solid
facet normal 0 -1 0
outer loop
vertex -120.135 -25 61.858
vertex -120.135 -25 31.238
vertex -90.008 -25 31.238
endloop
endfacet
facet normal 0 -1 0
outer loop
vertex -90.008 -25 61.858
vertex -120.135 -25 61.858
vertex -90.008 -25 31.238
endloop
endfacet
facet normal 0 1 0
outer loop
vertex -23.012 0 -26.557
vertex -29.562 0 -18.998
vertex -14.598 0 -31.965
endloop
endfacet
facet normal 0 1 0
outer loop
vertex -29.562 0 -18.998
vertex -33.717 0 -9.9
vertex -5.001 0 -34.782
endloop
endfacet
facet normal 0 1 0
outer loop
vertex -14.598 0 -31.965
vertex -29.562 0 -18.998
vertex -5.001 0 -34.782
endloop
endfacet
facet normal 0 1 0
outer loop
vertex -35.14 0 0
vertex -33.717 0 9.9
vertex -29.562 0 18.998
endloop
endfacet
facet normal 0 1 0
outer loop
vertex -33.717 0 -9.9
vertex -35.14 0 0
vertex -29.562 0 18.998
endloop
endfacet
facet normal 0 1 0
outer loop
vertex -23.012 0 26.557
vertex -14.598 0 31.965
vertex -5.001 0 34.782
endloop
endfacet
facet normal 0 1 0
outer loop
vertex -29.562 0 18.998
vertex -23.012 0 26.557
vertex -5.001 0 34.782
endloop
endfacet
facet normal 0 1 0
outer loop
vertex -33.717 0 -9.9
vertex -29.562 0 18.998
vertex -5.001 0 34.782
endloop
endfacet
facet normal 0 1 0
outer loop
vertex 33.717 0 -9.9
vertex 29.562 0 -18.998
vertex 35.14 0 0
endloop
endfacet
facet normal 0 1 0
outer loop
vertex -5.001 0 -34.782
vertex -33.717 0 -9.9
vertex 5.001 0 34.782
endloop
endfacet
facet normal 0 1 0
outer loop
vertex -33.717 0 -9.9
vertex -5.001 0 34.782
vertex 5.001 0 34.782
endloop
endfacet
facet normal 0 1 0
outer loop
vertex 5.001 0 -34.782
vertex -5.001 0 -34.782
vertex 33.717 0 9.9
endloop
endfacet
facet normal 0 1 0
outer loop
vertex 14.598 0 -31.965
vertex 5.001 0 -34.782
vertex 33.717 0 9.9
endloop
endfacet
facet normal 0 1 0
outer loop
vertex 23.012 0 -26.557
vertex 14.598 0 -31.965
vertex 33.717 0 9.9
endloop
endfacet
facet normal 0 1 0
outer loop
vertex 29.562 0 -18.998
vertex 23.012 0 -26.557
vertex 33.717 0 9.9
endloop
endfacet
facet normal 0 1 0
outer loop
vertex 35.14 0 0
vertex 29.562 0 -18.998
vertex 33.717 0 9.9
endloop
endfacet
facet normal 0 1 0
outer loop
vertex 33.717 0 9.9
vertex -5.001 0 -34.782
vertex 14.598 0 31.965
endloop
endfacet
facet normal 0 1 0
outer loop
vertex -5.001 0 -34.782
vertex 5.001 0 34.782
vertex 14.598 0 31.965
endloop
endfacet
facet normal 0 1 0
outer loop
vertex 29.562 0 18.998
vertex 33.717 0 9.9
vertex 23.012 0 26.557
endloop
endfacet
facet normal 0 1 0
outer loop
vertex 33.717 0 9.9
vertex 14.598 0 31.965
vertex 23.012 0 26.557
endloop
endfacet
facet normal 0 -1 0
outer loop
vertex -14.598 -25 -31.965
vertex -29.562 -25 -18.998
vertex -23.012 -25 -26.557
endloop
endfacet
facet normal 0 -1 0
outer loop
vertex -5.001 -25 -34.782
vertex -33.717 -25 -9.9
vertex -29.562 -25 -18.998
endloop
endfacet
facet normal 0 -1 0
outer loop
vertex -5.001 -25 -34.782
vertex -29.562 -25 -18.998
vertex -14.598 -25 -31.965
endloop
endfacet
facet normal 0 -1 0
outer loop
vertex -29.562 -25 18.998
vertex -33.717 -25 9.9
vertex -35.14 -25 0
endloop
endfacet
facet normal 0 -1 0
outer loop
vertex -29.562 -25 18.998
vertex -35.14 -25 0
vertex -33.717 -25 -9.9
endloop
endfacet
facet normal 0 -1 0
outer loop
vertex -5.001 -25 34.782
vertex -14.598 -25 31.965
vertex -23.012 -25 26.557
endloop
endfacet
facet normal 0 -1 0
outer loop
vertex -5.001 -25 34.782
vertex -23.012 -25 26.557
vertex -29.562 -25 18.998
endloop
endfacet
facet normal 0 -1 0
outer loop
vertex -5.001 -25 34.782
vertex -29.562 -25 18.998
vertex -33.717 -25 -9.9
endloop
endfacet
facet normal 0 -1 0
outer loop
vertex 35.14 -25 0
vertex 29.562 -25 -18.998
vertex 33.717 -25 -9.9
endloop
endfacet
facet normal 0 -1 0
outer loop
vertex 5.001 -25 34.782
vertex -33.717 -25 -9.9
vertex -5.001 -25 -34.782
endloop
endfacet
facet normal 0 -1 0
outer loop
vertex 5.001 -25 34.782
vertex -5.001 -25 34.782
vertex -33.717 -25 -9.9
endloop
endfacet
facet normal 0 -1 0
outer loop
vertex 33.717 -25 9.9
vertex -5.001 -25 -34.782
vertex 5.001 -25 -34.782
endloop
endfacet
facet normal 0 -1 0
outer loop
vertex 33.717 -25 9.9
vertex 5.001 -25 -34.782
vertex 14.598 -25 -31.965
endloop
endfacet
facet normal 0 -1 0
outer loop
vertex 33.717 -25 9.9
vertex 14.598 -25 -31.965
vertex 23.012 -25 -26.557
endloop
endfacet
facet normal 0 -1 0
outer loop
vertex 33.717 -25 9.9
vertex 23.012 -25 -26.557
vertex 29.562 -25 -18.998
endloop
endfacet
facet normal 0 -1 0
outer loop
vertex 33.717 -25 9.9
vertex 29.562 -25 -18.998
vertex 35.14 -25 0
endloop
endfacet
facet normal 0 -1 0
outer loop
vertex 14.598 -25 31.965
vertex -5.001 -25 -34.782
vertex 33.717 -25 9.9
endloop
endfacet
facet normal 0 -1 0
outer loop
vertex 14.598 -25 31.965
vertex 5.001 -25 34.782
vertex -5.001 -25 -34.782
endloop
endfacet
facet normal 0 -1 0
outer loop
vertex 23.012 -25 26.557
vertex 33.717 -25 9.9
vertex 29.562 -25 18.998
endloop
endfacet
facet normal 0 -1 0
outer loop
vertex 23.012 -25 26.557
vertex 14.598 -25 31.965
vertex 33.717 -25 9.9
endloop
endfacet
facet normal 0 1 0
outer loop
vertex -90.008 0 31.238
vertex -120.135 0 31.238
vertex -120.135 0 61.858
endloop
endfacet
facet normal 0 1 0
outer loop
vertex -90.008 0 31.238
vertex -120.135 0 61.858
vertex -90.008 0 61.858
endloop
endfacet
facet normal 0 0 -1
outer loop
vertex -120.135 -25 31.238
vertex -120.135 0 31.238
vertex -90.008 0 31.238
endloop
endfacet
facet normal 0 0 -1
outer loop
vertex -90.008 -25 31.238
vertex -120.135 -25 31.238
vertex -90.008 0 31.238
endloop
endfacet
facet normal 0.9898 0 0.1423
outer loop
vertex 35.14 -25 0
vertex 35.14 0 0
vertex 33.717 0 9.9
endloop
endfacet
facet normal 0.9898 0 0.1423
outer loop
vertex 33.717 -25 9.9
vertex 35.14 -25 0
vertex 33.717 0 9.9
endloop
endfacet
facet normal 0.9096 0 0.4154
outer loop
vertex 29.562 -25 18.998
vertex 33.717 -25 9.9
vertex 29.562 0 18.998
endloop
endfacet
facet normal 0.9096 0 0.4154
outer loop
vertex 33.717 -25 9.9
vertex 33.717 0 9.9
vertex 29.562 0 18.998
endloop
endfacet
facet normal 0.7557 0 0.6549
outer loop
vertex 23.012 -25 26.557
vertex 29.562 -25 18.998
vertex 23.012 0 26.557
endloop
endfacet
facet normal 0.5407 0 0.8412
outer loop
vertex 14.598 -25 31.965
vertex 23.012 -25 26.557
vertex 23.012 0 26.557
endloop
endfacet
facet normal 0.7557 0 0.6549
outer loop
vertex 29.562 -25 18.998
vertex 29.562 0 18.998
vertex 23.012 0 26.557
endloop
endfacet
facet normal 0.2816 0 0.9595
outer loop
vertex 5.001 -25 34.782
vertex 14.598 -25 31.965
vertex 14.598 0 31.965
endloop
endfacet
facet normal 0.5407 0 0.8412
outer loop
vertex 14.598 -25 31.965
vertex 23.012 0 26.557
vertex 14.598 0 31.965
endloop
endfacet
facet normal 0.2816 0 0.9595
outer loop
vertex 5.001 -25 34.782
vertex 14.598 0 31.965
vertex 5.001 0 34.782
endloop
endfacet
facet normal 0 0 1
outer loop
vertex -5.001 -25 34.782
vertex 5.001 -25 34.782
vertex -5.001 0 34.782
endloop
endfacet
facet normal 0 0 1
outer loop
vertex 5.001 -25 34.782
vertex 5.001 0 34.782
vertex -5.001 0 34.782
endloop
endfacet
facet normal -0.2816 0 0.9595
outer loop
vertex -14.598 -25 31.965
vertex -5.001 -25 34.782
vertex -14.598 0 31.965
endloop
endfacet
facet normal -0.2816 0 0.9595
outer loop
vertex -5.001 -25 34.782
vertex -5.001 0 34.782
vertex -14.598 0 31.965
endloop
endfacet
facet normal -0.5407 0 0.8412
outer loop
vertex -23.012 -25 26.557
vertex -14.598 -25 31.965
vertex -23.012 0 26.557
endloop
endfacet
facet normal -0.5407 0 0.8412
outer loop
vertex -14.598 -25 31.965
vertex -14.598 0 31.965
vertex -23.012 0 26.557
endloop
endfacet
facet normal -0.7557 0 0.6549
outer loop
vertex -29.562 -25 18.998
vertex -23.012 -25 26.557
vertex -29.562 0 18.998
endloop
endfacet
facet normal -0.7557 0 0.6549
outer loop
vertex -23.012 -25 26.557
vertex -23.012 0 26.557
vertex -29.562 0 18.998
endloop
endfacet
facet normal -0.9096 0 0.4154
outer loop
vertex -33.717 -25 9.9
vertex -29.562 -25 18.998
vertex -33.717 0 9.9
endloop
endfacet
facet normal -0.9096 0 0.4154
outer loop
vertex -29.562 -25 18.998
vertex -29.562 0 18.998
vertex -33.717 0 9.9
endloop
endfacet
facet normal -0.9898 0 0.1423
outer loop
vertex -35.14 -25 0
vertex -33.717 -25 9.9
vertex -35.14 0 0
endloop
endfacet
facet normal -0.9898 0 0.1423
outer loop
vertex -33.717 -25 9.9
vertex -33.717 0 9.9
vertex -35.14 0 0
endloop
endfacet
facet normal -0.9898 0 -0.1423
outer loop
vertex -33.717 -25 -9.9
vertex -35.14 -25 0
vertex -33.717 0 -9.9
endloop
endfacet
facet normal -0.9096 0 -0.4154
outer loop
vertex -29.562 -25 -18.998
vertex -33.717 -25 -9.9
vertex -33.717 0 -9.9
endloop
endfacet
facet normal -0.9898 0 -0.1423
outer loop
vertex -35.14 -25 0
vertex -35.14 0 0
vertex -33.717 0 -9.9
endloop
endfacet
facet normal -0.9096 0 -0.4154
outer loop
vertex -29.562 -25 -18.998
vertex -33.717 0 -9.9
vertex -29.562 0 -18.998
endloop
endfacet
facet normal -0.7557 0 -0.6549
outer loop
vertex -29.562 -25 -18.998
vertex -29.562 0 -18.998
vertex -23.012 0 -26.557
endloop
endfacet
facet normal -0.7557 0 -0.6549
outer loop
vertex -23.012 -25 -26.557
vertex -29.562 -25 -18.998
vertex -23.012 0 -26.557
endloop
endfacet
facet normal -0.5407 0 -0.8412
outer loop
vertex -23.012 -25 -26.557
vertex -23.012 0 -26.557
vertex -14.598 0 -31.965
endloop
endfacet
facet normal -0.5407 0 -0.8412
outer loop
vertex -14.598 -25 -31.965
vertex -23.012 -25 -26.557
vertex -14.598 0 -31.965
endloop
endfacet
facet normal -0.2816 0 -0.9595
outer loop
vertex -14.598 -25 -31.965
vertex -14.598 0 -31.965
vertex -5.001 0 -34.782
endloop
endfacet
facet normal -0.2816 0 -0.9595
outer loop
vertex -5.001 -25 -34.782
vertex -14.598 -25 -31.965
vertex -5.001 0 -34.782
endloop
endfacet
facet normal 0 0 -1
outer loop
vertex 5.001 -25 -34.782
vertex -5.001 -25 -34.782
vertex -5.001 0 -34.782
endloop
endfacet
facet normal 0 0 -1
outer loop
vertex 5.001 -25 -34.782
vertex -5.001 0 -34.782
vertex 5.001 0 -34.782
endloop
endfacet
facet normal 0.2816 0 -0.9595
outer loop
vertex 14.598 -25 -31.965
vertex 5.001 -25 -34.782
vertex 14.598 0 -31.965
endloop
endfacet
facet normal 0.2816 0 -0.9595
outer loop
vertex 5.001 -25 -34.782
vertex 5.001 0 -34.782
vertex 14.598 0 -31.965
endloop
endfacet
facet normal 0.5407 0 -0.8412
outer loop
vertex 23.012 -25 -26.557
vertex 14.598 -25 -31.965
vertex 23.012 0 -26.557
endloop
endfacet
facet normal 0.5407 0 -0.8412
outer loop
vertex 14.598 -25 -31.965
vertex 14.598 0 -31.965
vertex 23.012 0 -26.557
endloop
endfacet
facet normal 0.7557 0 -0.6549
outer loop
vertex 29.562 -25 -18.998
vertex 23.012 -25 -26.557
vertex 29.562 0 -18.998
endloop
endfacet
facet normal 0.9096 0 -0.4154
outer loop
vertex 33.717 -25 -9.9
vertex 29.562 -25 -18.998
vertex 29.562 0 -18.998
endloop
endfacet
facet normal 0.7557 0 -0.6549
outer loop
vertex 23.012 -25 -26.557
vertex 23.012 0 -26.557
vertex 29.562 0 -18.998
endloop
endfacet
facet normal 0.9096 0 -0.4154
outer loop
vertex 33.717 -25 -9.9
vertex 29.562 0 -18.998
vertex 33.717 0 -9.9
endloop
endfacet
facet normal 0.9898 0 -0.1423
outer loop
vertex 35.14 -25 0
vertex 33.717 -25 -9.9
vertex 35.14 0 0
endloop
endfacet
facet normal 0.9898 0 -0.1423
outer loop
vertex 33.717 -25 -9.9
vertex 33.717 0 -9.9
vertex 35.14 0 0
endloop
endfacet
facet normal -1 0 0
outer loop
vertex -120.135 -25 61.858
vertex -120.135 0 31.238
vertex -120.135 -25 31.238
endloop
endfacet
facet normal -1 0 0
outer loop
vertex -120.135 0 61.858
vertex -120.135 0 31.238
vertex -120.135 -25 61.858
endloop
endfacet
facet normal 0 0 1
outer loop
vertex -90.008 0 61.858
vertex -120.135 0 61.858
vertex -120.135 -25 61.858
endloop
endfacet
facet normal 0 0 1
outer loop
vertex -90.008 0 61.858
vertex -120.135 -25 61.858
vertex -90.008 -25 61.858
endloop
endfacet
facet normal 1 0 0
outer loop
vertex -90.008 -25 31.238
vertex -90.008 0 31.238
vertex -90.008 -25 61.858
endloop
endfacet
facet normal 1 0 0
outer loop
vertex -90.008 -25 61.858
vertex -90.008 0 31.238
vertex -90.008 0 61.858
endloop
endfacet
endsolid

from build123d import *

# Parameters (mm, degrees)
F0_R     = 35.140148
F1_DEPTH = 25
F2_W     = 30.126289
F2_H     = 30.620157
F3_DEPTH = 25


with BuildPart() as f1:
    # F0 (on Front) → F1 (new body)
    with BuildSketch(Plane.XZ):
        Circle(F0_R)
    extrude(amount=F1_DEPTH)


with BuildPart() as f3:
    # F2 (on Front) → F3 (new body)
    with BuildSketch(Plane.XZ):
        with Locations((-105.071589, 46.54758)):
            Rectangle(F2_W, F2_H)
    extrude(amount=F3_DEPTH)


solid = Compound([f1.part, f3.part])
